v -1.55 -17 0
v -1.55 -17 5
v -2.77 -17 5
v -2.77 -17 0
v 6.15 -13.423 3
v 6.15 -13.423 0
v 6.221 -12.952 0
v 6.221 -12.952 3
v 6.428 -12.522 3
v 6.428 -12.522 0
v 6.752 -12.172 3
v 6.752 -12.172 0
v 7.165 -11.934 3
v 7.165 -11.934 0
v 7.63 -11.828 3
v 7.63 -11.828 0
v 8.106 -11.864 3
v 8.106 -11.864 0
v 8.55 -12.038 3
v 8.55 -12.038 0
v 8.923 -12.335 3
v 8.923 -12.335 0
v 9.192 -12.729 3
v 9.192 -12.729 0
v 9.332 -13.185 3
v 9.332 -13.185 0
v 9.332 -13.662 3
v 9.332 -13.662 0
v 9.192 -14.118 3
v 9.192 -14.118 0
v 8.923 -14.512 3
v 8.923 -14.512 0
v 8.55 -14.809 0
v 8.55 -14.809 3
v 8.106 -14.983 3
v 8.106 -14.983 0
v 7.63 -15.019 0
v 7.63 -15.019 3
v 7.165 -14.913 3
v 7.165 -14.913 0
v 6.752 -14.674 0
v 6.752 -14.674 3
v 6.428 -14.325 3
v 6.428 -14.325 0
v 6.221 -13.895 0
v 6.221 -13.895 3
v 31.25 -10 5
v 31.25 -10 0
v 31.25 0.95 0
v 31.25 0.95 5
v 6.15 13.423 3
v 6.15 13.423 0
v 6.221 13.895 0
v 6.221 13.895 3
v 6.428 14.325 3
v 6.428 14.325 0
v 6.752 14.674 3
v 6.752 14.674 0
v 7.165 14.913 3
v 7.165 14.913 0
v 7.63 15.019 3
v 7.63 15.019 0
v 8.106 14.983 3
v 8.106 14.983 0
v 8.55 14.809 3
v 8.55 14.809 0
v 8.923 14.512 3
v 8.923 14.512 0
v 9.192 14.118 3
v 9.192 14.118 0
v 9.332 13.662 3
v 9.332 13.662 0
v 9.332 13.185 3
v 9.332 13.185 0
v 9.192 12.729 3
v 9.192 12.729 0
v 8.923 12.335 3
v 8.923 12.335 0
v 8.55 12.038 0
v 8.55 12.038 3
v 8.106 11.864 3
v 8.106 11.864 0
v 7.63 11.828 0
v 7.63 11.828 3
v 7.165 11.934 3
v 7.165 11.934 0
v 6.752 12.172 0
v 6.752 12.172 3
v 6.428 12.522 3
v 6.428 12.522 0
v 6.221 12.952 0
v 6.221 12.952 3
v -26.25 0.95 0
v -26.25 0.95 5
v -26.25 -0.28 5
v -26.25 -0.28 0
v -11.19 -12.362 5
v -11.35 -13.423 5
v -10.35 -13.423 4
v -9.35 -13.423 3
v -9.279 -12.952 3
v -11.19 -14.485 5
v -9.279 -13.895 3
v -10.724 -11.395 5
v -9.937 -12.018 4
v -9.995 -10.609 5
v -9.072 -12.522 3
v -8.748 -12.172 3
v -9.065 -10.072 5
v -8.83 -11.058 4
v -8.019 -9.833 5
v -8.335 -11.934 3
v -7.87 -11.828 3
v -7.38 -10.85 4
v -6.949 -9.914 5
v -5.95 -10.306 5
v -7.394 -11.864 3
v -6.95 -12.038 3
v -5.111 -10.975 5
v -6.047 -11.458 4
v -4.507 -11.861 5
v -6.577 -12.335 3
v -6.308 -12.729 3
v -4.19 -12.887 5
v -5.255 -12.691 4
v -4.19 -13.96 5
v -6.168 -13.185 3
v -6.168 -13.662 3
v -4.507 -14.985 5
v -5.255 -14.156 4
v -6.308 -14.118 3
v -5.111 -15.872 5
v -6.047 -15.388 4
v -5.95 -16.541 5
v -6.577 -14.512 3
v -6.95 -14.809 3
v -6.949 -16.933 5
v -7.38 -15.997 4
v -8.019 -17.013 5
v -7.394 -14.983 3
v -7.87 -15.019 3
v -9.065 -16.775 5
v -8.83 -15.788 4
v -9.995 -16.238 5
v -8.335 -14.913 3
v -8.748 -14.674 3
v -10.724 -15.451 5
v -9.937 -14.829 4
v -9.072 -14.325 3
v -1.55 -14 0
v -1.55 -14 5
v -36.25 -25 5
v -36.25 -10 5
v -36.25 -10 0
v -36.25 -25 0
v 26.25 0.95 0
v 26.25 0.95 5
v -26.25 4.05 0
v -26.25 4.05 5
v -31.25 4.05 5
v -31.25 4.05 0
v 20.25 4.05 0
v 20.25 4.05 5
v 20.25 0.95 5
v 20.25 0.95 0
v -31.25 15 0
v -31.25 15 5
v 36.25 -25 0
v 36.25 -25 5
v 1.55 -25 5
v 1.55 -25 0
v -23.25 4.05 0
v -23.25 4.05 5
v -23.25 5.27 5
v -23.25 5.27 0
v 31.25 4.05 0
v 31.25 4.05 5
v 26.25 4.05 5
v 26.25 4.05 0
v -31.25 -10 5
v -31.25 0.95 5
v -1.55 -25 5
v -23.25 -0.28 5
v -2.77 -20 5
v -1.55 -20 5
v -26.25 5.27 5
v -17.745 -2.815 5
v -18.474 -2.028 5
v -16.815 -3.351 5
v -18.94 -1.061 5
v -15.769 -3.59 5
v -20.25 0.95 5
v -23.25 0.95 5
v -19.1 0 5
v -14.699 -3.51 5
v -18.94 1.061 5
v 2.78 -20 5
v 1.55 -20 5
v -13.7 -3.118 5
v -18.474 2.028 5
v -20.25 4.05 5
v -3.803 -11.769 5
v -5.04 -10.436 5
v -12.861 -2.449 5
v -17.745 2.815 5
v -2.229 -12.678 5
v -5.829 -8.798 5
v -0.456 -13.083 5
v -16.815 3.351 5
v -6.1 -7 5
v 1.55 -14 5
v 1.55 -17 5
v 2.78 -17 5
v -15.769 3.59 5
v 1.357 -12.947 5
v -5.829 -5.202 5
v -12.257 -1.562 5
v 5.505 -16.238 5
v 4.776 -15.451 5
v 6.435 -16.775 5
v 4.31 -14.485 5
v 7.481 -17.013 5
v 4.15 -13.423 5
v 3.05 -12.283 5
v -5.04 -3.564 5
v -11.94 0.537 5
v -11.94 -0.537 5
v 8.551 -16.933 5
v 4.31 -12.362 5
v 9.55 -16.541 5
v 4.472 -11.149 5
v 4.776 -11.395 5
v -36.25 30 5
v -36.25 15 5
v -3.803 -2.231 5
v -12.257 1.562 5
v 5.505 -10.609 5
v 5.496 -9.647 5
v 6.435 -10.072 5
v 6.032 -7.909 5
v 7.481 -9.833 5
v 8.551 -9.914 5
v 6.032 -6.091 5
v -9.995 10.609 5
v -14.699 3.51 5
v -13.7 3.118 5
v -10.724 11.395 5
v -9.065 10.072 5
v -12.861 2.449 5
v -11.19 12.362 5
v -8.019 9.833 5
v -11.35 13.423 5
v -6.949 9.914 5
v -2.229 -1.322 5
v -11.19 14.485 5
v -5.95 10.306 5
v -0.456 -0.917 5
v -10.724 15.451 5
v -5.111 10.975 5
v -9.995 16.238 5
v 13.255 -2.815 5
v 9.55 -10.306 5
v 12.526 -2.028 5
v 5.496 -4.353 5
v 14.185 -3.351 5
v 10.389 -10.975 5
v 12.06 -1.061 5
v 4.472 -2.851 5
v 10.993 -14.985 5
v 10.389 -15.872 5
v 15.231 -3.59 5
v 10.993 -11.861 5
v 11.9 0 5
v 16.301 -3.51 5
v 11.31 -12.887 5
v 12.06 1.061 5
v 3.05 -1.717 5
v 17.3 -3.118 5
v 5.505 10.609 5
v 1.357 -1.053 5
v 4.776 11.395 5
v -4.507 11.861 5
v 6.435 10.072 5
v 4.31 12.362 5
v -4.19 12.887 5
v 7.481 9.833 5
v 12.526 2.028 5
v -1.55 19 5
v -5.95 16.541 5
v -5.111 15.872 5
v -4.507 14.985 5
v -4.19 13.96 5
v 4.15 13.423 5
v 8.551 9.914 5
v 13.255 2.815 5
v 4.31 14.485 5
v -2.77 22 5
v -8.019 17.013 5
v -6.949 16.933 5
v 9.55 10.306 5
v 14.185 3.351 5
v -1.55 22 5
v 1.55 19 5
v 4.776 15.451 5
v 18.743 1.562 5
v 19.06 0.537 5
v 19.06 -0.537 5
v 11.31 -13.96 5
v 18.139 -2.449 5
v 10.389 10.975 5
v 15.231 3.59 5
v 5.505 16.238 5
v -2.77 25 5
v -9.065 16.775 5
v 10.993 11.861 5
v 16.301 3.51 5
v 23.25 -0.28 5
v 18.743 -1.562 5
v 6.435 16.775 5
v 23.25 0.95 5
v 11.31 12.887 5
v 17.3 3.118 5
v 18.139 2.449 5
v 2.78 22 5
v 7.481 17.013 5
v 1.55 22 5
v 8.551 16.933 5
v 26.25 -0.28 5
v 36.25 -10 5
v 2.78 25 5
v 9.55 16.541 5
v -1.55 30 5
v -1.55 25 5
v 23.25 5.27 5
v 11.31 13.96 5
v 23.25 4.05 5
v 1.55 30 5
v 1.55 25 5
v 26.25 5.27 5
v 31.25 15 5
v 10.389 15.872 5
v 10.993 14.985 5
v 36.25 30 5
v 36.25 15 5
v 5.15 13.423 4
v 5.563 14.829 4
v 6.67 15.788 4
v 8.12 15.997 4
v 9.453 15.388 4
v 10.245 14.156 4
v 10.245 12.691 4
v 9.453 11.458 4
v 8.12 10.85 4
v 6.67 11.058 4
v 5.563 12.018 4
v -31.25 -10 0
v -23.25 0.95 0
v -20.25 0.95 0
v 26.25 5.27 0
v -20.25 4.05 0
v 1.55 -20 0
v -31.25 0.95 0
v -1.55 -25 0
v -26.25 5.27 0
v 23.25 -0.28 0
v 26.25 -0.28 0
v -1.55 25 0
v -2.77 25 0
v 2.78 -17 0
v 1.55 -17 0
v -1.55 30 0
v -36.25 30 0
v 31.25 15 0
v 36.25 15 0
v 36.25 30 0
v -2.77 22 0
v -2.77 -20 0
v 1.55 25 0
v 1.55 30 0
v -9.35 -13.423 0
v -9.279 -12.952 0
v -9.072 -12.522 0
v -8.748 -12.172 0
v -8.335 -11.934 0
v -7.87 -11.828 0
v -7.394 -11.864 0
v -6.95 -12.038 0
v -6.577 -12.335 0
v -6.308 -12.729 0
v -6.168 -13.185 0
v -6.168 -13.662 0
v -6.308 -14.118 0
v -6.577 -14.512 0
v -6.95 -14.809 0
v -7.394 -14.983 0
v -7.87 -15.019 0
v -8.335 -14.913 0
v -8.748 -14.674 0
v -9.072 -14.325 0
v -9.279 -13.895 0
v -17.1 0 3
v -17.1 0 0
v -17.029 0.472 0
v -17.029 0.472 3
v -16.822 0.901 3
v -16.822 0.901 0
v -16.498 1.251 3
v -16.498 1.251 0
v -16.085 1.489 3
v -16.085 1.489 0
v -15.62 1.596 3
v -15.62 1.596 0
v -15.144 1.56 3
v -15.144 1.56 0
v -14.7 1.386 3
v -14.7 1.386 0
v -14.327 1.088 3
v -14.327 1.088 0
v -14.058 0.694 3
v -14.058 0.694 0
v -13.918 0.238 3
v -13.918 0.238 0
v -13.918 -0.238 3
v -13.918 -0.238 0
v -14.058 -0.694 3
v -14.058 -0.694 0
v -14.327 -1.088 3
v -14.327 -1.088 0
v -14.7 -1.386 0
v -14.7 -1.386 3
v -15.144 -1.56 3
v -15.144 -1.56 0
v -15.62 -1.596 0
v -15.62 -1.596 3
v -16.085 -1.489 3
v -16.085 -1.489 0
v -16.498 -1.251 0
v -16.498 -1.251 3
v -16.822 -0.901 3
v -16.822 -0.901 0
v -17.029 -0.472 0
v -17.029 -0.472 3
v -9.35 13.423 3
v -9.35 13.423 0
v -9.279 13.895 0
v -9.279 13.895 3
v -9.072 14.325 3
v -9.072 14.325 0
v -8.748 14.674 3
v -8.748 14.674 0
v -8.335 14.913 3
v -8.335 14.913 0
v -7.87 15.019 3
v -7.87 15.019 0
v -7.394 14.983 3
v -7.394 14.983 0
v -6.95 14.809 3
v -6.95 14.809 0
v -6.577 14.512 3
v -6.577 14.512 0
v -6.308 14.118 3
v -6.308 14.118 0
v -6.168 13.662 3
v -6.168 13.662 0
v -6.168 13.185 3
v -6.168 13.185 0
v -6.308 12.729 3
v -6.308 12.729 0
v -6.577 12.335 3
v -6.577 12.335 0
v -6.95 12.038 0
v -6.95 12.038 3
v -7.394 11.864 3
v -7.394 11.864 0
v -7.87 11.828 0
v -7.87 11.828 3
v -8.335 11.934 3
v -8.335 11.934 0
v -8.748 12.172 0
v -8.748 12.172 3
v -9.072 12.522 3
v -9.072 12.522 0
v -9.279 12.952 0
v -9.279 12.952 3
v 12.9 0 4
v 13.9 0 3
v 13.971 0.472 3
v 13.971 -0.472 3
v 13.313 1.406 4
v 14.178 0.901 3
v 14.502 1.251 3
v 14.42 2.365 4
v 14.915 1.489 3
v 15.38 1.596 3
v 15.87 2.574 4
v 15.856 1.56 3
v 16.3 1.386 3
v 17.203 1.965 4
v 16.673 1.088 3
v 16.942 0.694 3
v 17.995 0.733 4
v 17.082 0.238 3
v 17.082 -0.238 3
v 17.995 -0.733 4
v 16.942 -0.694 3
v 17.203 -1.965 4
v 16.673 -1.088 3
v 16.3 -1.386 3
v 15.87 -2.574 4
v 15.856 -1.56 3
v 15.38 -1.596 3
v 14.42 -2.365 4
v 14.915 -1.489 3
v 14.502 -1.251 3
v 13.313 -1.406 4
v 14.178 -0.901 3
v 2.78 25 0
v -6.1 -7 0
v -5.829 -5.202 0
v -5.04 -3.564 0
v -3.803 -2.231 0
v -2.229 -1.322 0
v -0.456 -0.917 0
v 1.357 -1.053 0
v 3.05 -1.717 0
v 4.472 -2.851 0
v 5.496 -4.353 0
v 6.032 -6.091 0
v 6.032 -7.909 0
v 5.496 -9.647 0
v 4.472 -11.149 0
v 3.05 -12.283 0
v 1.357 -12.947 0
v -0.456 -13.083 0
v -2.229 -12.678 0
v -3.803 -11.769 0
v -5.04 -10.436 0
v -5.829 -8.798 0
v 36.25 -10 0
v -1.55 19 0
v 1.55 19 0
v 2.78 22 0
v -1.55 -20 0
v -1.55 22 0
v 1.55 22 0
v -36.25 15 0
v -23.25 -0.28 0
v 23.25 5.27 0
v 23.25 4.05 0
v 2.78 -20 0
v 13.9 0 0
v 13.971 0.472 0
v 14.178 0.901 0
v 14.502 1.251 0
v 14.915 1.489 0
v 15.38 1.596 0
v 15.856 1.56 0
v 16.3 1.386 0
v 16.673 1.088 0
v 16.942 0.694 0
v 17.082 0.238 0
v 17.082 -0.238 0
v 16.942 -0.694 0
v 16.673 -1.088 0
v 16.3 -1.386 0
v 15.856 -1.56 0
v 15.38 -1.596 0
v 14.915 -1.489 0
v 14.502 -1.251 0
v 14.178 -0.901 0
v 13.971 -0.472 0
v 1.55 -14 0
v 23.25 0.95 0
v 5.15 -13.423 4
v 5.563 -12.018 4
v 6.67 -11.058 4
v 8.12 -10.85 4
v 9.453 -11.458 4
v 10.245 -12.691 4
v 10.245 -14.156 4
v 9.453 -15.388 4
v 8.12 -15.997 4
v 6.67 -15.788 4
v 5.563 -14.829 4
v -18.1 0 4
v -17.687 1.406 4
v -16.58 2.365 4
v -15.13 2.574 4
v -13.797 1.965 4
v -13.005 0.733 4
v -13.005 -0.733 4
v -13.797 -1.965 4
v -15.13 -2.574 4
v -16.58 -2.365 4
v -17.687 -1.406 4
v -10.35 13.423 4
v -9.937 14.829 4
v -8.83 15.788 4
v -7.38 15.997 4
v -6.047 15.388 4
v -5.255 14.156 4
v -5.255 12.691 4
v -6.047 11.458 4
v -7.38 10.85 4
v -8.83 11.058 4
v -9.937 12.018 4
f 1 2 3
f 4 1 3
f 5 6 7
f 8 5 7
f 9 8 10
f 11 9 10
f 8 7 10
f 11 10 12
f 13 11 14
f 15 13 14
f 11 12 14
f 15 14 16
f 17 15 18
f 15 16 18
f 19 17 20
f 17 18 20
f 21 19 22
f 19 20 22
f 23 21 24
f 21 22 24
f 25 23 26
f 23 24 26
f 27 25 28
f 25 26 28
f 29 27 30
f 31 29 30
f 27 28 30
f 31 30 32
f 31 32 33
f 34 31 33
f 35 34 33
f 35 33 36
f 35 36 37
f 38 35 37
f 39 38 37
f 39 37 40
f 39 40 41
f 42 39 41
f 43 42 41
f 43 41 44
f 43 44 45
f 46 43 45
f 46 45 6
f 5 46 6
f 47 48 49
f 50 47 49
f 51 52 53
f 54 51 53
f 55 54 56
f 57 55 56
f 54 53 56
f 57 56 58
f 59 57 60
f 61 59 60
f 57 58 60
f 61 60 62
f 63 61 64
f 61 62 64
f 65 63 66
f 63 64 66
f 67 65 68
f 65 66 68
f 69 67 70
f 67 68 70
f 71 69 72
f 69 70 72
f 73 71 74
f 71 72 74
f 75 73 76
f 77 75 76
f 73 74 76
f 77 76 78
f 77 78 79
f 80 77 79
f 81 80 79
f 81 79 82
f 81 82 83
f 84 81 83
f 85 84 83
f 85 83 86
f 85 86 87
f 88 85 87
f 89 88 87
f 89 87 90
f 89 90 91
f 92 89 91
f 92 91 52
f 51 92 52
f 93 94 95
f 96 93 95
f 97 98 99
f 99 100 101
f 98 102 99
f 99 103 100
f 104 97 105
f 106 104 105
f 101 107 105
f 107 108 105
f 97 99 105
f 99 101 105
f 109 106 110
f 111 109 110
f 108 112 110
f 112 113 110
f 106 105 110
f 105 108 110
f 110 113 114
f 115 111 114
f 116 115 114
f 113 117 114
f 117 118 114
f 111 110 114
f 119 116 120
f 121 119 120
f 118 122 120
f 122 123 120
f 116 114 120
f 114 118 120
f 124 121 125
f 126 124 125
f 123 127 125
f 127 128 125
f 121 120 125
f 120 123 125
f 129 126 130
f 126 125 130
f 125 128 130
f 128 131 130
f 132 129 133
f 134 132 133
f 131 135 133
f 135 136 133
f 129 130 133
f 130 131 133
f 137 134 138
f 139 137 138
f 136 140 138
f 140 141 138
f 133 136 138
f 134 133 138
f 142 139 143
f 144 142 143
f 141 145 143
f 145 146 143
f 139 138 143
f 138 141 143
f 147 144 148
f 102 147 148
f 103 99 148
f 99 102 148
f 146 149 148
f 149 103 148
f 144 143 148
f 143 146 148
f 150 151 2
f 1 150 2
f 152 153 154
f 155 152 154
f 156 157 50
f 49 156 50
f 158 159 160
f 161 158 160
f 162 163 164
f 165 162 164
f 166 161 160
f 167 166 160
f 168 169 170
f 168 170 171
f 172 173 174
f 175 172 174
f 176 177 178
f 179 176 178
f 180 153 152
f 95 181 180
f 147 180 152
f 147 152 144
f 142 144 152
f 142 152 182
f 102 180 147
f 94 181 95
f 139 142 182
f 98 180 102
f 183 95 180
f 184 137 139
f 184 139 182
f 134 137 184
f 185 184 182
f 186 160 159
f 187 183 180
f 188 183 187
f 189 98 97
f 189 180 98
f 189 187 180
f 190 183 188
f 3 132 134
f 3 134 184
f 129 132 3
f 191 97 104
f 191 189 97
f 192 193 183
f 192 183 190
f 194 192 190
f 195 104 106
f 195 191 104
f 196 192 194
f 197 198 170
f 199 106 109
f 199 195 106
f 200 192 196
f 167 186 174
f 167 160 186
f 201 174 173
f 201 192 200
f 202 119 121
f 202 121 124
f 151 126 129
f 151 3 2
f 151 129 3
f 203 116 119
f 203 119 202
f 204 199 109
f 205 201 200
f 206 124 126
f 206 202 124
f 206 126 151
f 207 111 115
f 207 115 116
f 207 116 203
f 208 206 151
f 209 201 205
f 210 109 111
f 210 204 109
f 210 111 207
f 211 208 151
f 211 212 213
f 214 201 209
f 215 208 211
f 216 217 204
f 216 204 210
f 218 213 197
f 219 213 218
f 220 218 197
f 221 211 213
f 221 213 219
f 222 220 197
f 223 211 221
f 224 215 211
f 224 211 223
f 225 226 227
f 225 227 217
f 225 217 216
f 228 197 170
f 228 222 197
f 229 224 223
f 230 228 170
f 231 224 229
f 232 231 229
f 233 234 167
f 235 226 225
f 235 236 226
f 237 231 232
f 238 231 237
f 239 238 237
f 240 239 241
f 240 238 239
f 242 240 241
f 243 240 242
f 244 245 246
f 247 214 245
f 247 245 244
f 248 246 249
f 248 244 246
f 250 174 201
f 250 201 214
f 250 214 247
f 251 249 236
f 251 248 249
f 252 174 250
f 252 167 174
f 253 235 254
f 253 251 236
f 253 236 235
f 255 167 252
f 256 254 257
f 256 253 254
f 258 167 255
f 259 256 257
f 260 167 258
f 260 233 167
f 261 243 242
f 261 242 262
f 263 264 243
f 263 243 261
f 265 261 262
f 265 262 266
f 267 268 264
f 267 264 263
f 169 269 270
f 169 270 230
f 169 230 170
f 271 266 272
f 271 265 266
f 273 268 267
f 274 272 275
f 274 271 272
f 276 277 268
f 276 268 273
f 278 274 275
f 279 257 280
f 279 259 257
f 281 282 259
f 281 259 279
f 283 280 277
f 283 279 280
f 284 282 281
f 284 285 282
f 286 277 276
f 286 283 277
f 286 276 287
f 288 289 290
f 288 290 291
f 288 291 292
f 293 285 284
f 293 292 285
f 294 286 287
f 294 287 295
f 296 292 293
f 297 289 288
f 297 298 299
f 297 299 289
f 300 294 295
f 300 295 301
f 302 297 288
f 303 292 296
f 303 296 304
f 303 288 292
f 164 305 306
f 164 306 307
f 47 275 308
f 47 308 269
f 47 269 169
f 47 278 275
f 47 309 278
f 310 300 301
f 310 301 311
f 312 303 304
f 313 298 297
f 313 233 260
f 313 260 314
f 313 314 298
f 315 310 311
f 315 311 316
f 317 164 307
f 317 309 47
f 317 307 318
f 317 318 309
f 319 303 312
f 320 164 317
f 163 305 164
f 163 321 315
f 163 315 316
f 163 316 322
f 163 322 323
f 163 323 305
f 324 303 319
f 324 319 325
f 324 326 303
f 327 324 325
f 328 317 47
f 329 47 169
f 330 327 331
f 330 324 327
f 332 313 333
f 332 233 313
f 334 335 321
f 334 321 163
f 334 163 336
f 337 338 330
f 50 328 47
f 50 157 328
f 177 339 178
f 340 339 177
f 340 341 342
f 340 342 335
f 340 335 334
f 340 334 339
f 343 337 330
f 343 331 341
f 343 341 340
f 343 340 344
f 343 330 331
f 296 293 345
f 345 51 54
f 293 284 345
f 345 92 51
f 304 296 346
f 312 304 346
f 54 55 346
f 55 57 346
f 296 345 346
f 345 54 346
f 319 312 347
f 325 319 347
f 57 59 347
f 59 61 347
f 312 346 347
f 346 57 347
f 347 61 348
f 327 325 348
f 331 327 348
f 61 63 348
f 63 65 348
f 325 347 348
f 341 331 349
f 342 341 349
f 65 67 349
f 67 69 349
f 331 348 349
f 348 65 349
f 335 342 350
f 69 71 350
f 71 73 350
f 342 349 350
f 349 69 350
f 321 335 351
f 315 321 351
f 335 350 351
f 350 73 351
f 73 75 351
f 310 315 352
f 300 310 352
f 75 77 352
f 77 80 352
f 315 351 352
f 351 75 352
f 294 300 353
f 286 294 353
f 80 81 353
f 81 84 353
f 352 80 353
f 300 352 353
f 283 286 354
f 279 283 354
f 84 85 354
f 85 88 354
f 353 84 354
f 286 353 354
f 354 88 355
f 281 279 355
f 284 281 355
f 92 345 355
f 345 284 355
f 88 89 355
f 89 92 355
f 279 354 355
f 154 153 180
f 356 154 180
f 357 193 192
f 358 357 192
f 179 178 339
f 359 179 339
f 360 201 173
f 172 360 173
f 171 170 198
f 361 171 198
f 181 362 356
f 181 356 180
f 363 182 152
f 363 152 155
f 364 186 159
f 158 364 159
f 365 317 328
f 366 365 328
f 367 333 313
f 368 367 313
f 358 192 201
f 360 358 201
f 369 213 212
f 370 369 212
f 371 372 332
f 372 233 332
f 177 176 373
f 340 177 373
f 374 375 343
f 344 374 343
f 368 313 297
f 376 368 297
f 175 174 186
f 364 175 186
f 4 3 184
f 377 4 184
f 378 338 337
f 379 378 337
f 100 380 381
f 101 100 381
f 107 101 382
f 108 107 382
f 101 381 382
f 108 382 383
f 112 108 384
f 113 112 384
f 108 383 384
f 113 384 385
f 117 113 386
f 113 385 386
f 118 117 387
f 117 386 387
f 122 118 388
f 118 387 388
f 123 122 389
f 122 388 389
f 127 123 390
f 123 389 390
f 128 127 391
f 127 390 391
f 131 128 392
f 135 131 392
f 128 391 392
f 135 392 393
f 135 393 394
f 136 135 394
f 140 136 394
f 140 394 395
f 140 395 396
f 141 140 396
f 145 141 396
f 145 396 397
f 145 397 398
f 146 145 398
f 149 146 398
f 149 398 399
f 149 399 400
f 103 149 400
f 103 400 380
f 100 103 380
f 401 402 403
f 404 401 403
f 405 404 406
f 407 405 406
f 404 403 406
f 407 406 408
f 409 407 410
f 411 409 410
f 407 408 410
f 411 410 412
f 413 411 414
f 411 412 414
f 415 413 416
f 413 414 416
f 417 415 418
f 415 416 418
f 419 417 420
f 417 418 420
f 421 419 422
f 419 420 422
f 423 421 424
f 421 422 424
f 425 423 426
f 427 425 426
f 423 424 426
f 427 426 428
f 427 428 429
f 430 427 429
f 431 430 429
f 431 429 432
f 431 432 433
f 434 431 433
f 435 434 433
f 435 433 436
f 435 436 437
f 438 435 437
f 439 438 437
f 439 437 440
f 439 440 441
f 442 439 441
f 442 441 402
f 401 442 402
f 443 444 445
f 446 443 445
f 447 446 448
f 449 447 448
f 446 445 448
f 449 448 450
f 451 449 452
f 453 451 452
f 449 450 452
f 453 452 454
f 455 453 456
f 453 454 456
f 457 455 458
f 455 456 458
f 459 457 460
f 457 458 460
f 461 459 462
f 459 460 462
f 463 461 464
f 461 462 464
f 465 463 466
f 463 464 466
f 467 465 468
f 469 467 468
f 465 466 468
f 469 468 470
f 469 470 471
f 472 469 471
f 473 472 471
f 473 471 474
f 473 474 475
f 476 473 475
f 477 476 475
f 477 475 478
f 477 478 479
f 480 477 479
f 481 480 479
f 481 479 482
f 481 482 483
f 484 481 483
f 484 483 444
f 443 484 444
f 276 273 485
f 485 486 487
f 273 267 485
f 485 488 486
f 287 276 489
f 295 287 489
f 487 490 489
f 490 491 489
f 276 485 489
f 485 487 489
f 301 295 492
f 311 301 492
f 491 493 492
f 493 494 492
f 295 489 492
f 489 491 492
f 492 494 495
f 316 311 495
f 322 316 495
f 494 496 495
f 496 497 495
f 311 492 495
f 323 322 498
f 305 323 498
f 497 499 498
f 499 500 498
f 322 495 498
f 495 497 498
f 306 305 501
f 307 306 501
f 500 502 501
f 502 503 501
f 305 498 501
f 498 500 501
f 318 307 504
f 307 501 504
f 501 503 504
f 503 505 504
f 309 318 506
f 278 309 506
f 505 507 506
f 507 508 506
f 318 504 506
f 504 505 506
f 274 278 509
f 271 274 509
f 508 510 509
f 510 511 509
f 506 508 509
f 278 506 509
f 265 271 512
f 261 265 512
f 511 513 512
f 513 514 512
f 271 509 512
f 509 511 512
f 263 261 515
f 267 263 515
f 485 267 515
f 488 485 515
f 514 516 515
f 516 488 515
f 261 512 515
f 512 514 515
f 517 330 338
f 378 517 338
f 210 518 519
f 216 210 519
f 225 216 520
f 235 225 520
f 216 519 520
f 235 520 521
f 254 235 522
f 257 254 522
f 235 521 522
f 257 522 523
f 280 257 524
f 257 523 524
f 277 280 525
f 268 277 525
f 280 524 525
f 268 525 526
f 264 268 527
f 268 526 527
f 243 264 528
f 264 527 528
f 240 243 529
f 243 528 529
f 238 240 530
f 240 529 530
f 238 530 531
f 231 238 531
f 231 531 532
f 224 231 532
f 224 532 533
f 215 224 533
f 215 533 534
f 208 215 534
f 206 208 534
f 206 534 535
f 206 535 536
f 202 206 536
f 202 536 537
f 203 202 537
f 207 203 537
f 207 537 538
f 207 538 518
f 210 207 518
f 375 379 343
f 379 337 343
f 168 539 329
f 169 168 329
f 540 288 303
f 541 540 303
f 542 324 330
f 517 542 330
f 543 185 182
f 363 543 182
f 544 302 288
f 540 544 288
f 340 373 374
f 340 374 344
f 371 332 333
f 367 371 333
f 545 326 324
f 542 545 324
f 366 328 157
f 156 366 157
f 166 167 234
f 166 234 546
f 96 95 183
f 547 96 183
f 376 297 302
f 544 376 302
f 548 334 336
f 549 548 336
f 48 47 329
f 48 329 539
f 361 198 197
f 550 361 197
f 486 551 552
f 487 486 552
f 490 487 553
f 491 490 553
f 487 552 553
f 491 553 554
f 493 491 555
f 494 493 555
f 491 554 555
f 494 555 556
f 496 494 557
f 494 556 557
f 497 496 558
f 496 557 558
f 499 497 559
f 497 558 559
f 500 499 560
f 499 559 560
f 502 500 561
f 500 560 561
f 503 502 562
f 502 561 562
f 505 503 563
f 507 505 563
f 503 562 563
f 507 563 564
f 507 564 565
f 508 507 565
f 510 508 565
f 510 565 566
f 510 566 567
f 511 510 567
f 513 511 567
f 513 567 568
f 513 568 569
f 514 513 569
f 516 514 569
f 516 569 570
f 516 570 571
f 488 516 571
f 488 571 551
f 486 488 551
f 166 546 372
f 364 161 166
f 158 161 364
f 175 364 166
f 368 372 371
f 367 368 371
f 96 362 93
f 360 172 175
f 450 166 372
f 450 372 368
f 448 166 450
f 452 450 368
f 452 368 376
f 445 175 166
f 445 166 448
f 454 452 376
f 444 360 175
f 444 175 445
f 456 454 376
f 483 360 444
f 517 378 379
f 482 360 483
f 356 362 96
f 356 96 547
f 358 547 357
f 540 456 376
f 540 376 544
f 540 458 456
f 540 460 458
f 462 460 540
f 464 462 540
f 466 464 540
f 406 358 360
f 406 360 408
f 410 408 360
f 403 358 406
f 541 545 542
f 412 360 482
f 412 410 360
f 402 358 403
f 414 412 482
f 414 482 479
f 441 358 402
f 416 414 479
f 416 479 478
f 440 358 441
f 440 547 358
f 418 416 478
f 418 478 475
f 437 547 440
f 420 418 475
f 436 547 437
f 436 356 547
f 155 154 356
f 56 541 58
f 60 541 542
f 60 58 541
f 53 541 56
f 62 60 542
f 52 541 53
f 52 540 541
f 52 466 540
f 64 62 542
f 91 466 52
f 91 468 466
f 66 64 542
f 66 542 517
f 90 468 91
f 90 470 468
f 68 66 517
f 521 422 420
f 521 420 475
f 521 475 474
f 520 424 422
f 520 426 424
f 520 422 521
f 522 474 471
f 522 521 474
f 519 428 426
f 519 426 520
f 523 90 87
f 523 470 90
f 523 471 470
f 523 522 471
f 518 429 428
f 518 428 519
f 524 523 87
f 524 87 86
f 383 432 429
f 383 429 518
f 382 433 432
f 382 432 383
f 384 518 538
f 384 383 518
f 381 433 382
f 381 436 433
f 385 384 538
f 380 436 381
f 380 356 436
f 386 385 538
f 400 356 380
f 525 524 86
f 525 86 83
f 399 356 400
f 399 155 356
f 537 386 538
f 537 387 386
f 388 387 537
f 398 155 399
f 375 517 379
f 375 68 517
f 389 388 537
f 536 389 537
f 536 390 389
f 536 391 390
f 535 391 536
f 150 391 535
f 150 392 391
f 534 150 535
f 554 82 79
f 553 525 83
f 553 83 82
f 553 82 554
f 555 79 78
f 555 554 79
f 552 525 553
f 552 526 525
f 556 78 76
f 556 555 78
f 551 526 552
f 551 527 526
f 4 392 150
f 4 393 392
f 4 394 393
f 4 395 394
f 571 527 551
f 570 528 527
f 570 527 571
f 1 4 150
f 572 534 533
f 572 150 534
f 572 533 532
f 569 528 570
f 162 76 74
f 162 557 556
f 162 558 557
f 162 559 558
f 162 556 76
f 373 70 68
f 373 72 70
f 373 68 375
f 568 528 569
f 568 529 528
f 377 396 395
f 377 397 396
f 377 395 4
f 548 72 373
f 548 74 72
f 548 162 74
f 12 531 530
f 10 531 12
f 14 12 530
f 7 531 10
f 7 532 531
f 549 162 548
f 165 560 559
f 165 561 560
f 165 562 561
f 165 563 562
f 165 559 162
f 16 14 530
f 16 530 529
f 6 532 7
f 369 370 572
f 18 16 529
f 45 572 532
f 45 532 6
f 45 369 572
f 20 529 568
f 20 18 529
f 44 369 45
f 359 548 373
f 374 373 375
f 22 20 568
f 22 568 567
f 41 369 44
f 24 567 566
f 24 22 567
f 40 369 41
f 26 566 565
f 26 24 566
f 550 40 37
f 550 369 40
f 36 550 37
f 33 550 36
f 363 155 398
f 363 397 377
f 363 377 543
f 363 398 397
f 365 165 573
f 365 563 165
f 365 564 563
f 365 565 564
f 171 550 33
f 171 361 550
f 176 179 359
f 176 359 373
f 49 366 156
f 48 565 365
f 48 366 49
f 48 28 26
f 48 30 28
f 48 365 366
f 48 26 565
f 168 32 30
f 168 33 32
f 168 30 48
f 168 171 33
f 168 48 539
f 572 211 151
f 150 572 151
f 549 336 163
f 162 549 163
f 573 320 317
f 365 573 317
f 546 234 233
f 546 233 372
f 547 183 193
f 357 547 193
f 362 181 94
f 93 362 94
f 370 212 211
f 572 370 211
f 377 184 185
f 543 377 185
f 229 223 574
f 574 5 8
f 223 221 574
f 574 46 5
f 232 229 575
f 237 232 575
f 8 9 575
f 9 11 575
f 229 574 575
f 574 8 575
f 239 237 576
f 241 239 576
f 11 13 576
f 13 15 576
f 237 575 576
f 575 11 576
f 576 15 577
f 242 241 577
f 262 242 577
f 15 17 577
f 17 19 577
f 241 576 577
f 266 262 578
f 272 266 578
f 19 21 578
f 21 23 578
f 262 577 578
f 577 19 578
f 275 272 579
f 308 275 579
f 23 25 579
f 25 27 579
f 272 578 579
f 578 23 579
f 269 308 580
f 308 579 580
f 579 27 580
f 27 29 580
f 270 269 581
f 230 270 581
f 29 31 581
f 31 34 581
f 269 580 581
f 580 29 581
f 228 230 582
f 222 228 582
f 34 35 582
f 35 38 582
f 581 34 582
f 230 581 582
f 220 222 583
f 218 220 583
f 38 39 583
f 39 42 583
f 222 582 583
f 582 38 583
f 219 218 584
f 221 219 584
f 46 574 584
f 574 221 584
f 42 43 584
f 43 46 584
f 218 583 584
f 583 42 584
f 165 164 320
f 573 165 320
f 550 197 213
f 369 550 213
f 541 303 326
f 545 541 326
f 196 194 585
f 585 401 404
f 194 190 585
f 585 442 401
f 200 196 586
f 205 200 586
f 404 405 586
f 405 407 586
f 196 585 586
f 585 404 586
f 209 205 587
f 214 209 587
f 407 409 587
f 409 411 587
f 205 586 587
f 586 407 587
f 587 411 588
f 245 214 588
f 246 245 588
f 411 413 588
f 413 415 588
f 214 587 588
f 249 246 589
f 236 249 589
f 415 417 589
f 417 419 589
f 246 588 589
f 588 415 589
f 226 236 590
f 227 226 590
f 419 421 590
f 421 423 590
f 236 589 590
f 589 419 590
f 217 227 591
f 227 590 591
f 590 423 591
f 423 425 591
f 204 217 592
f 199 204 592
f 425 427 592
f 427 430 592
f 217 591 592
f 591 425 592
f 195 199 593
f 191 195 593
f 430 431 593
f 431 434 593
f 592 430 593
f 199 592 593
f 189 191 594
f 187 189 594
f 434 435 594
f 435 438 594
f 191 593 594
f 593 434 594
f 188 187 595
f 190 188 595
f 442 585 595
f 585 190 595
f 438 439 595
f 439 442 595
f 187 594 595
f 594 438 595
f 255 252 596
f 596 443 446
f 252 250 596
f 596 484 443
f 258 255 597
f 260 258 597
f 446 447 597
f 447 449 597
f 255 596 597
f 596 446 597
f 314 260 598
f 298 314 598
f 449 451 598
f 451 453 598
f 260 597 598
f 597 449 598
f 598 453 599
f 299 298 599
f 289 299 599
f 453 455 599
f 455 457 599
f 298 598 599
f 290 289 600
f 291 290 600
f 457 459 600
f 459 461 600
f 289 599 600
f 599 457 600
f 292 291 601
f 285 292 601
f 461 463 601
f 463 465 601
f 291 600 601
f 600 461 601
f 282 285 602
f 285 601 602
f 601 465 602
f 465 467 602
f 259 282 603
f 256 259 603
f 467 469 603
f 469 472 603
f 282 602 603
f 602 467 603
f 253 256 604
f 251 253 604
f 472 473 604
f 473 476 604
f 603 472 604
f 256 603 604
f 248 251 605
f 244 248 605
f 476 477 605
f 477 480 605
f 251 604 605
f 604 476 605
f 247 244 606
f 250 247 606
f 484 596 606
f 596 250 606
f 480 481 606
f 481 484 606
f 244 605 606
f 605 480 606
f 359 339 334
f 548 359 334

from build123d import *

# Parameters (mm, degrees)
ESQUISSE1_W                           = 26.253582595
ESQUISSE1_H                           = 55
BOSS_EXTRU_1_DEPTH                    = 5
BOSS_EXTRU_2_DEPTH                    = 5
BOSS_EXTRU_3_DEPTH                    = 5
ENL_V_MAT_EXTRU_1_DEPTH               = 5
ESQUISSE5_W                           = 5
ESQUISSE5_H                           = 50
BOSS_EXTRU_4_DEPTH                    = 36.246417405
BOSS_EXTRU_5_DEPTH                    = 5
BOSS_EXTRU_6_DEPTH                    = 5
BOSS_EXTRU_7_DEPTH                    = 5
DIAM_TRE_DU_PER_AGE_12_2_12_2_1_D     = 12.2
DIAM_TRE_DU_PER_AGE_12_2_12_2_1_DEPTH = 5
DIAM_TRE_DU_PER_AGE_3_2_3_2_1_D       = 3.2
CONG_1_R                              = 1.6
ESQUISSE13_W                          = 9.997056275
ESQUISSE13_H                          = 5
ESQUISSE13_W_2                        = 2.945778535
ESQUISSE13_W_3                        = 2.95
ESQUISSE13_W_4                        = 5
ESQUISSE13_H_2                        = 2.95
BOSS_EXTRU_8_DEPTH                    = 5
ENL_V_MAT_EXTRU_2_DEPTH               = 5
CHANFREIN1_SIZE                       = 2


with BuildPart() as part:
    # Esquisse1 → Boss.-Extru.1 (new body)
    with BuildSketch(Plane(origin=(0, 0, 0), x_dir=(-1, 0, 0), z_dir=(0, 0, -1))):
        with Locations((-18.123208703, 2.5)):
            Rectangle(ESQUISSE1_W, ESQUISSE1_H)
    extrude(amount=-BOSS_EXTRU_1_DEPTH)

    # Esquisse2 → Boss.-Extru.2 (add)
    with BuildSketch(Plane(origin=(31.25, 0, 0), x_dir=(0, 0, -1), z_dir=(1, 0, 0))):
        Polygon((0, 15), (-2.05, 15), (-5, 17.95), (-5, 30), (0, 30), align=None)
    extrude(amount=BOSS_EXTRU_2_DEPTH)

    # Esquisse3 → Boss.-Extru.3 (add)
    with BuildSketch(Plane(origin=(31.25, 0, 0), x_dir=(0, 0, -1), z_dir=(1, 0, 0))):
        Polygon((-5, -12.95), (-2.05, -10), (0, -10), (0, -25), (-5, -25), align=None)
    extrude(amount=BOSS_EXTRU_3_DEPTH)

    # Esquisse4 → Enlèv. mat.-Extru.1 (cut)
    with BuildSketch(Plane(origin=(0, 30, 0), x_dir=(-1, 0, 0), z_dir=(0, 1, 0))):
        Polygon((-4.996417405, 5), (-7.946417405, 5), (-4.996417405, 2.05), align=None)
    extrude(amount=-ENL_V_MAT_EXTRU_1_DEPTH, mode=Mode.SUBTRACT)

    # Esquisse5 → Boss.-Extru.4 (add)
    with BuildSketch(Plane.ZY.offset(-4.996417405)):
        with Locations((2.5, 0)):
            Rectangle(ESQUISSE5_W, ESQUISSE5_H)
    extrude(amount=BOSS_EXTRU_4_DEPTH)

    # Esquisse6 → Boss.-Extru.5 (add)
    with BuildSketch(Plane.ZY.offset(31.25)):
        Polygon((0, -25), (0, -10), (2.05, -10), (5, -12.95), (5, -25), align=None)
    extrude(amount=BOSS_EXTRU_5_DEPTH)

    # Esquisse7 → Boss.-Extru.6 (add)
    with BuildSketch(Plane.ZY.offset(31.25)):
        Polygon((0, 25), (5, 25), (5, 17.95), (2.05, 15), (0, 15), align=None)
    extrude(amount=BOSS_EXTRU_6_DEPTH)

    # Esquisse8 → Boss.-Extru.7 (add)
    with BuildSketch(Plane(origin=(0, 25, 0), x_dir=(-1, 0, 0), z_dir=(0, 1, 0))):
        Polygon((5.00063887, 2.054221466), (7.946417405, 5), (36.25, 5), (36.25, 0), (5.00063887, 0), align=None)
    extrude(amount=BOSS_EXTRU_7_DEPTH)

    # Diamètre du perçage Ø12.2 (12.2)1
    with Locations(Plane.XY.offset(5)):
        with Locations((0, -7)):
            Hole(DIAM_TRE_DU_PER_AGE_12_2_12_2_1_D / 2, depth=DIAM_TRE_DU_PER_AGE_12_2_12_2_1_DEPTH)

    # Diamètre du perçage Ø3.2 (3.2)1 (through all)
    with Locations(Plane.XY.offset(5)):
        with Locations((-7.75, -13.423393759), (15.5, 0), (-7.75, 13.423393759), (7.75, 13.423393759), (7.75, -13.423393759), (-15.5, 0)):
            Hole(DIAM_TRE_DU_PER_AGE_3_2_3_2_1_D / 2)

    # Congé1
    cong_1_edges = [part.edges().sort_by_distance(p)[0] for p in [
        (-5.00063887, 27.5, 2.054221466),
        (33.75, 15, 2.05),
        (33.75, -10, 2.05),
        (4.996417405, 27.5, 2.05),
        (-33.75, -10, 2.05),
        (-33.75, 15, 2.05),
    ]]
    fillet(cong_1_edges, radius=CONG_1_R)

    # Esquisse13 → Boss.-Extru.8 (add)
    with BuildSketch(Plane.XY.offset(5)):
        with Locations((-0.002110733, 27.5)):
            Rectangle(ESQUISSE13_W, ESQUISSE13_H)
        with Locations((-6.473528138, 27.5)):
            Rectangle(ESQUISSE13_W_2, ESQUISSE13_H)
        with Locations((6.471417405, 27.5)):
            Rectangle(ESQUISSE13_W_3, ESQUISSE13_H)
        with Locations((33.75, 16.475)):
            Rectangle(ESQUISSE13_W_4, ESQUISSE13_H_2)
        with Locations((33.75, -11.475)):
            Rectangle(ESQUISSE13_W_4, ESQUISSE13_H_2)
        with Locations((-33.75, -11.475)):
            Rectangle(ESQUISSE13_W_4, ESQUISSE13_H_2)
        with Locations((-33.75, 16.475)):
            Rectangle(ESQUISSE13_W_4, ESQUISSE13_H_2)
    extrude(amount=-BOSS_EXTRU_8_DEPTH)

    # Esquisse14 → Enlèv. mat.-Extru.2 (cut)
    with BuildSketch(Plane.XY.offset(5)):
        Polygon((-1.55, 19), (1.55, 19), (1.55, 22), (2.78, 22), (2.78, 25), (1.55, 25), (1.55, 30), (-1.55, 30), (-1.55, 25), (-2.77, 25), (-2.77, 22), (-1.55, 22), align=None)
        Polygon((-23.25, 0.95), (-20.25, 0.95), (-20.25, 4.05), (-23.25, 4.05), (-23.25, 5.27), (-26.25, 5.27), (-26.25, 4.05), (-31.25, 4.05), (-31.25, 0.95), (-26.25, 0.95), (-26.25, -0.28), (-23.25, -0.28), align=None)
        Polygon((23.25, -0.28), (26.25, -0.28), (26.25, 0.95), (31.25, 0.95), (31.25, 4.05), (26.25, 4.05), (26.25, 5.27), (23.25, 5.27), (23.25, 4.05), (20.25, 4.05), (20.25, 0.95), (23.25, 0.95), align=None)
        Polygon((-1.55, -17), (-2.77, -17), (-2.77, -20), (-1.55, -20), (-1.55, -25), (1.55, -25), (1.55, -20), (2.78, -20), (2.78, -17), (1.55, -17), (1.55, -14), (-1.55, -14), align=None)
    extrude(amount=-ENL_V_MAT_EXTRU_2_DEPTH, mode=Mode.SUBTRACT)

    # Chanfrein1
    chanfrein1_edges = [part.edges().sort_by_distance(p)[0] for p in [
        (-13.9, 0, 5),
        (9.35, -13.423393759, 5),
        (9.35, 13.423393759, 5),
        (-6.15, 13.423393759, 5),
        (17.1, 0, 5),
        (-6.15, -13.423393759, 5),
    ]]
    chamfer(chanfrein1_edges, length=CHANFREIN1_SIZE)


solid = part.part
